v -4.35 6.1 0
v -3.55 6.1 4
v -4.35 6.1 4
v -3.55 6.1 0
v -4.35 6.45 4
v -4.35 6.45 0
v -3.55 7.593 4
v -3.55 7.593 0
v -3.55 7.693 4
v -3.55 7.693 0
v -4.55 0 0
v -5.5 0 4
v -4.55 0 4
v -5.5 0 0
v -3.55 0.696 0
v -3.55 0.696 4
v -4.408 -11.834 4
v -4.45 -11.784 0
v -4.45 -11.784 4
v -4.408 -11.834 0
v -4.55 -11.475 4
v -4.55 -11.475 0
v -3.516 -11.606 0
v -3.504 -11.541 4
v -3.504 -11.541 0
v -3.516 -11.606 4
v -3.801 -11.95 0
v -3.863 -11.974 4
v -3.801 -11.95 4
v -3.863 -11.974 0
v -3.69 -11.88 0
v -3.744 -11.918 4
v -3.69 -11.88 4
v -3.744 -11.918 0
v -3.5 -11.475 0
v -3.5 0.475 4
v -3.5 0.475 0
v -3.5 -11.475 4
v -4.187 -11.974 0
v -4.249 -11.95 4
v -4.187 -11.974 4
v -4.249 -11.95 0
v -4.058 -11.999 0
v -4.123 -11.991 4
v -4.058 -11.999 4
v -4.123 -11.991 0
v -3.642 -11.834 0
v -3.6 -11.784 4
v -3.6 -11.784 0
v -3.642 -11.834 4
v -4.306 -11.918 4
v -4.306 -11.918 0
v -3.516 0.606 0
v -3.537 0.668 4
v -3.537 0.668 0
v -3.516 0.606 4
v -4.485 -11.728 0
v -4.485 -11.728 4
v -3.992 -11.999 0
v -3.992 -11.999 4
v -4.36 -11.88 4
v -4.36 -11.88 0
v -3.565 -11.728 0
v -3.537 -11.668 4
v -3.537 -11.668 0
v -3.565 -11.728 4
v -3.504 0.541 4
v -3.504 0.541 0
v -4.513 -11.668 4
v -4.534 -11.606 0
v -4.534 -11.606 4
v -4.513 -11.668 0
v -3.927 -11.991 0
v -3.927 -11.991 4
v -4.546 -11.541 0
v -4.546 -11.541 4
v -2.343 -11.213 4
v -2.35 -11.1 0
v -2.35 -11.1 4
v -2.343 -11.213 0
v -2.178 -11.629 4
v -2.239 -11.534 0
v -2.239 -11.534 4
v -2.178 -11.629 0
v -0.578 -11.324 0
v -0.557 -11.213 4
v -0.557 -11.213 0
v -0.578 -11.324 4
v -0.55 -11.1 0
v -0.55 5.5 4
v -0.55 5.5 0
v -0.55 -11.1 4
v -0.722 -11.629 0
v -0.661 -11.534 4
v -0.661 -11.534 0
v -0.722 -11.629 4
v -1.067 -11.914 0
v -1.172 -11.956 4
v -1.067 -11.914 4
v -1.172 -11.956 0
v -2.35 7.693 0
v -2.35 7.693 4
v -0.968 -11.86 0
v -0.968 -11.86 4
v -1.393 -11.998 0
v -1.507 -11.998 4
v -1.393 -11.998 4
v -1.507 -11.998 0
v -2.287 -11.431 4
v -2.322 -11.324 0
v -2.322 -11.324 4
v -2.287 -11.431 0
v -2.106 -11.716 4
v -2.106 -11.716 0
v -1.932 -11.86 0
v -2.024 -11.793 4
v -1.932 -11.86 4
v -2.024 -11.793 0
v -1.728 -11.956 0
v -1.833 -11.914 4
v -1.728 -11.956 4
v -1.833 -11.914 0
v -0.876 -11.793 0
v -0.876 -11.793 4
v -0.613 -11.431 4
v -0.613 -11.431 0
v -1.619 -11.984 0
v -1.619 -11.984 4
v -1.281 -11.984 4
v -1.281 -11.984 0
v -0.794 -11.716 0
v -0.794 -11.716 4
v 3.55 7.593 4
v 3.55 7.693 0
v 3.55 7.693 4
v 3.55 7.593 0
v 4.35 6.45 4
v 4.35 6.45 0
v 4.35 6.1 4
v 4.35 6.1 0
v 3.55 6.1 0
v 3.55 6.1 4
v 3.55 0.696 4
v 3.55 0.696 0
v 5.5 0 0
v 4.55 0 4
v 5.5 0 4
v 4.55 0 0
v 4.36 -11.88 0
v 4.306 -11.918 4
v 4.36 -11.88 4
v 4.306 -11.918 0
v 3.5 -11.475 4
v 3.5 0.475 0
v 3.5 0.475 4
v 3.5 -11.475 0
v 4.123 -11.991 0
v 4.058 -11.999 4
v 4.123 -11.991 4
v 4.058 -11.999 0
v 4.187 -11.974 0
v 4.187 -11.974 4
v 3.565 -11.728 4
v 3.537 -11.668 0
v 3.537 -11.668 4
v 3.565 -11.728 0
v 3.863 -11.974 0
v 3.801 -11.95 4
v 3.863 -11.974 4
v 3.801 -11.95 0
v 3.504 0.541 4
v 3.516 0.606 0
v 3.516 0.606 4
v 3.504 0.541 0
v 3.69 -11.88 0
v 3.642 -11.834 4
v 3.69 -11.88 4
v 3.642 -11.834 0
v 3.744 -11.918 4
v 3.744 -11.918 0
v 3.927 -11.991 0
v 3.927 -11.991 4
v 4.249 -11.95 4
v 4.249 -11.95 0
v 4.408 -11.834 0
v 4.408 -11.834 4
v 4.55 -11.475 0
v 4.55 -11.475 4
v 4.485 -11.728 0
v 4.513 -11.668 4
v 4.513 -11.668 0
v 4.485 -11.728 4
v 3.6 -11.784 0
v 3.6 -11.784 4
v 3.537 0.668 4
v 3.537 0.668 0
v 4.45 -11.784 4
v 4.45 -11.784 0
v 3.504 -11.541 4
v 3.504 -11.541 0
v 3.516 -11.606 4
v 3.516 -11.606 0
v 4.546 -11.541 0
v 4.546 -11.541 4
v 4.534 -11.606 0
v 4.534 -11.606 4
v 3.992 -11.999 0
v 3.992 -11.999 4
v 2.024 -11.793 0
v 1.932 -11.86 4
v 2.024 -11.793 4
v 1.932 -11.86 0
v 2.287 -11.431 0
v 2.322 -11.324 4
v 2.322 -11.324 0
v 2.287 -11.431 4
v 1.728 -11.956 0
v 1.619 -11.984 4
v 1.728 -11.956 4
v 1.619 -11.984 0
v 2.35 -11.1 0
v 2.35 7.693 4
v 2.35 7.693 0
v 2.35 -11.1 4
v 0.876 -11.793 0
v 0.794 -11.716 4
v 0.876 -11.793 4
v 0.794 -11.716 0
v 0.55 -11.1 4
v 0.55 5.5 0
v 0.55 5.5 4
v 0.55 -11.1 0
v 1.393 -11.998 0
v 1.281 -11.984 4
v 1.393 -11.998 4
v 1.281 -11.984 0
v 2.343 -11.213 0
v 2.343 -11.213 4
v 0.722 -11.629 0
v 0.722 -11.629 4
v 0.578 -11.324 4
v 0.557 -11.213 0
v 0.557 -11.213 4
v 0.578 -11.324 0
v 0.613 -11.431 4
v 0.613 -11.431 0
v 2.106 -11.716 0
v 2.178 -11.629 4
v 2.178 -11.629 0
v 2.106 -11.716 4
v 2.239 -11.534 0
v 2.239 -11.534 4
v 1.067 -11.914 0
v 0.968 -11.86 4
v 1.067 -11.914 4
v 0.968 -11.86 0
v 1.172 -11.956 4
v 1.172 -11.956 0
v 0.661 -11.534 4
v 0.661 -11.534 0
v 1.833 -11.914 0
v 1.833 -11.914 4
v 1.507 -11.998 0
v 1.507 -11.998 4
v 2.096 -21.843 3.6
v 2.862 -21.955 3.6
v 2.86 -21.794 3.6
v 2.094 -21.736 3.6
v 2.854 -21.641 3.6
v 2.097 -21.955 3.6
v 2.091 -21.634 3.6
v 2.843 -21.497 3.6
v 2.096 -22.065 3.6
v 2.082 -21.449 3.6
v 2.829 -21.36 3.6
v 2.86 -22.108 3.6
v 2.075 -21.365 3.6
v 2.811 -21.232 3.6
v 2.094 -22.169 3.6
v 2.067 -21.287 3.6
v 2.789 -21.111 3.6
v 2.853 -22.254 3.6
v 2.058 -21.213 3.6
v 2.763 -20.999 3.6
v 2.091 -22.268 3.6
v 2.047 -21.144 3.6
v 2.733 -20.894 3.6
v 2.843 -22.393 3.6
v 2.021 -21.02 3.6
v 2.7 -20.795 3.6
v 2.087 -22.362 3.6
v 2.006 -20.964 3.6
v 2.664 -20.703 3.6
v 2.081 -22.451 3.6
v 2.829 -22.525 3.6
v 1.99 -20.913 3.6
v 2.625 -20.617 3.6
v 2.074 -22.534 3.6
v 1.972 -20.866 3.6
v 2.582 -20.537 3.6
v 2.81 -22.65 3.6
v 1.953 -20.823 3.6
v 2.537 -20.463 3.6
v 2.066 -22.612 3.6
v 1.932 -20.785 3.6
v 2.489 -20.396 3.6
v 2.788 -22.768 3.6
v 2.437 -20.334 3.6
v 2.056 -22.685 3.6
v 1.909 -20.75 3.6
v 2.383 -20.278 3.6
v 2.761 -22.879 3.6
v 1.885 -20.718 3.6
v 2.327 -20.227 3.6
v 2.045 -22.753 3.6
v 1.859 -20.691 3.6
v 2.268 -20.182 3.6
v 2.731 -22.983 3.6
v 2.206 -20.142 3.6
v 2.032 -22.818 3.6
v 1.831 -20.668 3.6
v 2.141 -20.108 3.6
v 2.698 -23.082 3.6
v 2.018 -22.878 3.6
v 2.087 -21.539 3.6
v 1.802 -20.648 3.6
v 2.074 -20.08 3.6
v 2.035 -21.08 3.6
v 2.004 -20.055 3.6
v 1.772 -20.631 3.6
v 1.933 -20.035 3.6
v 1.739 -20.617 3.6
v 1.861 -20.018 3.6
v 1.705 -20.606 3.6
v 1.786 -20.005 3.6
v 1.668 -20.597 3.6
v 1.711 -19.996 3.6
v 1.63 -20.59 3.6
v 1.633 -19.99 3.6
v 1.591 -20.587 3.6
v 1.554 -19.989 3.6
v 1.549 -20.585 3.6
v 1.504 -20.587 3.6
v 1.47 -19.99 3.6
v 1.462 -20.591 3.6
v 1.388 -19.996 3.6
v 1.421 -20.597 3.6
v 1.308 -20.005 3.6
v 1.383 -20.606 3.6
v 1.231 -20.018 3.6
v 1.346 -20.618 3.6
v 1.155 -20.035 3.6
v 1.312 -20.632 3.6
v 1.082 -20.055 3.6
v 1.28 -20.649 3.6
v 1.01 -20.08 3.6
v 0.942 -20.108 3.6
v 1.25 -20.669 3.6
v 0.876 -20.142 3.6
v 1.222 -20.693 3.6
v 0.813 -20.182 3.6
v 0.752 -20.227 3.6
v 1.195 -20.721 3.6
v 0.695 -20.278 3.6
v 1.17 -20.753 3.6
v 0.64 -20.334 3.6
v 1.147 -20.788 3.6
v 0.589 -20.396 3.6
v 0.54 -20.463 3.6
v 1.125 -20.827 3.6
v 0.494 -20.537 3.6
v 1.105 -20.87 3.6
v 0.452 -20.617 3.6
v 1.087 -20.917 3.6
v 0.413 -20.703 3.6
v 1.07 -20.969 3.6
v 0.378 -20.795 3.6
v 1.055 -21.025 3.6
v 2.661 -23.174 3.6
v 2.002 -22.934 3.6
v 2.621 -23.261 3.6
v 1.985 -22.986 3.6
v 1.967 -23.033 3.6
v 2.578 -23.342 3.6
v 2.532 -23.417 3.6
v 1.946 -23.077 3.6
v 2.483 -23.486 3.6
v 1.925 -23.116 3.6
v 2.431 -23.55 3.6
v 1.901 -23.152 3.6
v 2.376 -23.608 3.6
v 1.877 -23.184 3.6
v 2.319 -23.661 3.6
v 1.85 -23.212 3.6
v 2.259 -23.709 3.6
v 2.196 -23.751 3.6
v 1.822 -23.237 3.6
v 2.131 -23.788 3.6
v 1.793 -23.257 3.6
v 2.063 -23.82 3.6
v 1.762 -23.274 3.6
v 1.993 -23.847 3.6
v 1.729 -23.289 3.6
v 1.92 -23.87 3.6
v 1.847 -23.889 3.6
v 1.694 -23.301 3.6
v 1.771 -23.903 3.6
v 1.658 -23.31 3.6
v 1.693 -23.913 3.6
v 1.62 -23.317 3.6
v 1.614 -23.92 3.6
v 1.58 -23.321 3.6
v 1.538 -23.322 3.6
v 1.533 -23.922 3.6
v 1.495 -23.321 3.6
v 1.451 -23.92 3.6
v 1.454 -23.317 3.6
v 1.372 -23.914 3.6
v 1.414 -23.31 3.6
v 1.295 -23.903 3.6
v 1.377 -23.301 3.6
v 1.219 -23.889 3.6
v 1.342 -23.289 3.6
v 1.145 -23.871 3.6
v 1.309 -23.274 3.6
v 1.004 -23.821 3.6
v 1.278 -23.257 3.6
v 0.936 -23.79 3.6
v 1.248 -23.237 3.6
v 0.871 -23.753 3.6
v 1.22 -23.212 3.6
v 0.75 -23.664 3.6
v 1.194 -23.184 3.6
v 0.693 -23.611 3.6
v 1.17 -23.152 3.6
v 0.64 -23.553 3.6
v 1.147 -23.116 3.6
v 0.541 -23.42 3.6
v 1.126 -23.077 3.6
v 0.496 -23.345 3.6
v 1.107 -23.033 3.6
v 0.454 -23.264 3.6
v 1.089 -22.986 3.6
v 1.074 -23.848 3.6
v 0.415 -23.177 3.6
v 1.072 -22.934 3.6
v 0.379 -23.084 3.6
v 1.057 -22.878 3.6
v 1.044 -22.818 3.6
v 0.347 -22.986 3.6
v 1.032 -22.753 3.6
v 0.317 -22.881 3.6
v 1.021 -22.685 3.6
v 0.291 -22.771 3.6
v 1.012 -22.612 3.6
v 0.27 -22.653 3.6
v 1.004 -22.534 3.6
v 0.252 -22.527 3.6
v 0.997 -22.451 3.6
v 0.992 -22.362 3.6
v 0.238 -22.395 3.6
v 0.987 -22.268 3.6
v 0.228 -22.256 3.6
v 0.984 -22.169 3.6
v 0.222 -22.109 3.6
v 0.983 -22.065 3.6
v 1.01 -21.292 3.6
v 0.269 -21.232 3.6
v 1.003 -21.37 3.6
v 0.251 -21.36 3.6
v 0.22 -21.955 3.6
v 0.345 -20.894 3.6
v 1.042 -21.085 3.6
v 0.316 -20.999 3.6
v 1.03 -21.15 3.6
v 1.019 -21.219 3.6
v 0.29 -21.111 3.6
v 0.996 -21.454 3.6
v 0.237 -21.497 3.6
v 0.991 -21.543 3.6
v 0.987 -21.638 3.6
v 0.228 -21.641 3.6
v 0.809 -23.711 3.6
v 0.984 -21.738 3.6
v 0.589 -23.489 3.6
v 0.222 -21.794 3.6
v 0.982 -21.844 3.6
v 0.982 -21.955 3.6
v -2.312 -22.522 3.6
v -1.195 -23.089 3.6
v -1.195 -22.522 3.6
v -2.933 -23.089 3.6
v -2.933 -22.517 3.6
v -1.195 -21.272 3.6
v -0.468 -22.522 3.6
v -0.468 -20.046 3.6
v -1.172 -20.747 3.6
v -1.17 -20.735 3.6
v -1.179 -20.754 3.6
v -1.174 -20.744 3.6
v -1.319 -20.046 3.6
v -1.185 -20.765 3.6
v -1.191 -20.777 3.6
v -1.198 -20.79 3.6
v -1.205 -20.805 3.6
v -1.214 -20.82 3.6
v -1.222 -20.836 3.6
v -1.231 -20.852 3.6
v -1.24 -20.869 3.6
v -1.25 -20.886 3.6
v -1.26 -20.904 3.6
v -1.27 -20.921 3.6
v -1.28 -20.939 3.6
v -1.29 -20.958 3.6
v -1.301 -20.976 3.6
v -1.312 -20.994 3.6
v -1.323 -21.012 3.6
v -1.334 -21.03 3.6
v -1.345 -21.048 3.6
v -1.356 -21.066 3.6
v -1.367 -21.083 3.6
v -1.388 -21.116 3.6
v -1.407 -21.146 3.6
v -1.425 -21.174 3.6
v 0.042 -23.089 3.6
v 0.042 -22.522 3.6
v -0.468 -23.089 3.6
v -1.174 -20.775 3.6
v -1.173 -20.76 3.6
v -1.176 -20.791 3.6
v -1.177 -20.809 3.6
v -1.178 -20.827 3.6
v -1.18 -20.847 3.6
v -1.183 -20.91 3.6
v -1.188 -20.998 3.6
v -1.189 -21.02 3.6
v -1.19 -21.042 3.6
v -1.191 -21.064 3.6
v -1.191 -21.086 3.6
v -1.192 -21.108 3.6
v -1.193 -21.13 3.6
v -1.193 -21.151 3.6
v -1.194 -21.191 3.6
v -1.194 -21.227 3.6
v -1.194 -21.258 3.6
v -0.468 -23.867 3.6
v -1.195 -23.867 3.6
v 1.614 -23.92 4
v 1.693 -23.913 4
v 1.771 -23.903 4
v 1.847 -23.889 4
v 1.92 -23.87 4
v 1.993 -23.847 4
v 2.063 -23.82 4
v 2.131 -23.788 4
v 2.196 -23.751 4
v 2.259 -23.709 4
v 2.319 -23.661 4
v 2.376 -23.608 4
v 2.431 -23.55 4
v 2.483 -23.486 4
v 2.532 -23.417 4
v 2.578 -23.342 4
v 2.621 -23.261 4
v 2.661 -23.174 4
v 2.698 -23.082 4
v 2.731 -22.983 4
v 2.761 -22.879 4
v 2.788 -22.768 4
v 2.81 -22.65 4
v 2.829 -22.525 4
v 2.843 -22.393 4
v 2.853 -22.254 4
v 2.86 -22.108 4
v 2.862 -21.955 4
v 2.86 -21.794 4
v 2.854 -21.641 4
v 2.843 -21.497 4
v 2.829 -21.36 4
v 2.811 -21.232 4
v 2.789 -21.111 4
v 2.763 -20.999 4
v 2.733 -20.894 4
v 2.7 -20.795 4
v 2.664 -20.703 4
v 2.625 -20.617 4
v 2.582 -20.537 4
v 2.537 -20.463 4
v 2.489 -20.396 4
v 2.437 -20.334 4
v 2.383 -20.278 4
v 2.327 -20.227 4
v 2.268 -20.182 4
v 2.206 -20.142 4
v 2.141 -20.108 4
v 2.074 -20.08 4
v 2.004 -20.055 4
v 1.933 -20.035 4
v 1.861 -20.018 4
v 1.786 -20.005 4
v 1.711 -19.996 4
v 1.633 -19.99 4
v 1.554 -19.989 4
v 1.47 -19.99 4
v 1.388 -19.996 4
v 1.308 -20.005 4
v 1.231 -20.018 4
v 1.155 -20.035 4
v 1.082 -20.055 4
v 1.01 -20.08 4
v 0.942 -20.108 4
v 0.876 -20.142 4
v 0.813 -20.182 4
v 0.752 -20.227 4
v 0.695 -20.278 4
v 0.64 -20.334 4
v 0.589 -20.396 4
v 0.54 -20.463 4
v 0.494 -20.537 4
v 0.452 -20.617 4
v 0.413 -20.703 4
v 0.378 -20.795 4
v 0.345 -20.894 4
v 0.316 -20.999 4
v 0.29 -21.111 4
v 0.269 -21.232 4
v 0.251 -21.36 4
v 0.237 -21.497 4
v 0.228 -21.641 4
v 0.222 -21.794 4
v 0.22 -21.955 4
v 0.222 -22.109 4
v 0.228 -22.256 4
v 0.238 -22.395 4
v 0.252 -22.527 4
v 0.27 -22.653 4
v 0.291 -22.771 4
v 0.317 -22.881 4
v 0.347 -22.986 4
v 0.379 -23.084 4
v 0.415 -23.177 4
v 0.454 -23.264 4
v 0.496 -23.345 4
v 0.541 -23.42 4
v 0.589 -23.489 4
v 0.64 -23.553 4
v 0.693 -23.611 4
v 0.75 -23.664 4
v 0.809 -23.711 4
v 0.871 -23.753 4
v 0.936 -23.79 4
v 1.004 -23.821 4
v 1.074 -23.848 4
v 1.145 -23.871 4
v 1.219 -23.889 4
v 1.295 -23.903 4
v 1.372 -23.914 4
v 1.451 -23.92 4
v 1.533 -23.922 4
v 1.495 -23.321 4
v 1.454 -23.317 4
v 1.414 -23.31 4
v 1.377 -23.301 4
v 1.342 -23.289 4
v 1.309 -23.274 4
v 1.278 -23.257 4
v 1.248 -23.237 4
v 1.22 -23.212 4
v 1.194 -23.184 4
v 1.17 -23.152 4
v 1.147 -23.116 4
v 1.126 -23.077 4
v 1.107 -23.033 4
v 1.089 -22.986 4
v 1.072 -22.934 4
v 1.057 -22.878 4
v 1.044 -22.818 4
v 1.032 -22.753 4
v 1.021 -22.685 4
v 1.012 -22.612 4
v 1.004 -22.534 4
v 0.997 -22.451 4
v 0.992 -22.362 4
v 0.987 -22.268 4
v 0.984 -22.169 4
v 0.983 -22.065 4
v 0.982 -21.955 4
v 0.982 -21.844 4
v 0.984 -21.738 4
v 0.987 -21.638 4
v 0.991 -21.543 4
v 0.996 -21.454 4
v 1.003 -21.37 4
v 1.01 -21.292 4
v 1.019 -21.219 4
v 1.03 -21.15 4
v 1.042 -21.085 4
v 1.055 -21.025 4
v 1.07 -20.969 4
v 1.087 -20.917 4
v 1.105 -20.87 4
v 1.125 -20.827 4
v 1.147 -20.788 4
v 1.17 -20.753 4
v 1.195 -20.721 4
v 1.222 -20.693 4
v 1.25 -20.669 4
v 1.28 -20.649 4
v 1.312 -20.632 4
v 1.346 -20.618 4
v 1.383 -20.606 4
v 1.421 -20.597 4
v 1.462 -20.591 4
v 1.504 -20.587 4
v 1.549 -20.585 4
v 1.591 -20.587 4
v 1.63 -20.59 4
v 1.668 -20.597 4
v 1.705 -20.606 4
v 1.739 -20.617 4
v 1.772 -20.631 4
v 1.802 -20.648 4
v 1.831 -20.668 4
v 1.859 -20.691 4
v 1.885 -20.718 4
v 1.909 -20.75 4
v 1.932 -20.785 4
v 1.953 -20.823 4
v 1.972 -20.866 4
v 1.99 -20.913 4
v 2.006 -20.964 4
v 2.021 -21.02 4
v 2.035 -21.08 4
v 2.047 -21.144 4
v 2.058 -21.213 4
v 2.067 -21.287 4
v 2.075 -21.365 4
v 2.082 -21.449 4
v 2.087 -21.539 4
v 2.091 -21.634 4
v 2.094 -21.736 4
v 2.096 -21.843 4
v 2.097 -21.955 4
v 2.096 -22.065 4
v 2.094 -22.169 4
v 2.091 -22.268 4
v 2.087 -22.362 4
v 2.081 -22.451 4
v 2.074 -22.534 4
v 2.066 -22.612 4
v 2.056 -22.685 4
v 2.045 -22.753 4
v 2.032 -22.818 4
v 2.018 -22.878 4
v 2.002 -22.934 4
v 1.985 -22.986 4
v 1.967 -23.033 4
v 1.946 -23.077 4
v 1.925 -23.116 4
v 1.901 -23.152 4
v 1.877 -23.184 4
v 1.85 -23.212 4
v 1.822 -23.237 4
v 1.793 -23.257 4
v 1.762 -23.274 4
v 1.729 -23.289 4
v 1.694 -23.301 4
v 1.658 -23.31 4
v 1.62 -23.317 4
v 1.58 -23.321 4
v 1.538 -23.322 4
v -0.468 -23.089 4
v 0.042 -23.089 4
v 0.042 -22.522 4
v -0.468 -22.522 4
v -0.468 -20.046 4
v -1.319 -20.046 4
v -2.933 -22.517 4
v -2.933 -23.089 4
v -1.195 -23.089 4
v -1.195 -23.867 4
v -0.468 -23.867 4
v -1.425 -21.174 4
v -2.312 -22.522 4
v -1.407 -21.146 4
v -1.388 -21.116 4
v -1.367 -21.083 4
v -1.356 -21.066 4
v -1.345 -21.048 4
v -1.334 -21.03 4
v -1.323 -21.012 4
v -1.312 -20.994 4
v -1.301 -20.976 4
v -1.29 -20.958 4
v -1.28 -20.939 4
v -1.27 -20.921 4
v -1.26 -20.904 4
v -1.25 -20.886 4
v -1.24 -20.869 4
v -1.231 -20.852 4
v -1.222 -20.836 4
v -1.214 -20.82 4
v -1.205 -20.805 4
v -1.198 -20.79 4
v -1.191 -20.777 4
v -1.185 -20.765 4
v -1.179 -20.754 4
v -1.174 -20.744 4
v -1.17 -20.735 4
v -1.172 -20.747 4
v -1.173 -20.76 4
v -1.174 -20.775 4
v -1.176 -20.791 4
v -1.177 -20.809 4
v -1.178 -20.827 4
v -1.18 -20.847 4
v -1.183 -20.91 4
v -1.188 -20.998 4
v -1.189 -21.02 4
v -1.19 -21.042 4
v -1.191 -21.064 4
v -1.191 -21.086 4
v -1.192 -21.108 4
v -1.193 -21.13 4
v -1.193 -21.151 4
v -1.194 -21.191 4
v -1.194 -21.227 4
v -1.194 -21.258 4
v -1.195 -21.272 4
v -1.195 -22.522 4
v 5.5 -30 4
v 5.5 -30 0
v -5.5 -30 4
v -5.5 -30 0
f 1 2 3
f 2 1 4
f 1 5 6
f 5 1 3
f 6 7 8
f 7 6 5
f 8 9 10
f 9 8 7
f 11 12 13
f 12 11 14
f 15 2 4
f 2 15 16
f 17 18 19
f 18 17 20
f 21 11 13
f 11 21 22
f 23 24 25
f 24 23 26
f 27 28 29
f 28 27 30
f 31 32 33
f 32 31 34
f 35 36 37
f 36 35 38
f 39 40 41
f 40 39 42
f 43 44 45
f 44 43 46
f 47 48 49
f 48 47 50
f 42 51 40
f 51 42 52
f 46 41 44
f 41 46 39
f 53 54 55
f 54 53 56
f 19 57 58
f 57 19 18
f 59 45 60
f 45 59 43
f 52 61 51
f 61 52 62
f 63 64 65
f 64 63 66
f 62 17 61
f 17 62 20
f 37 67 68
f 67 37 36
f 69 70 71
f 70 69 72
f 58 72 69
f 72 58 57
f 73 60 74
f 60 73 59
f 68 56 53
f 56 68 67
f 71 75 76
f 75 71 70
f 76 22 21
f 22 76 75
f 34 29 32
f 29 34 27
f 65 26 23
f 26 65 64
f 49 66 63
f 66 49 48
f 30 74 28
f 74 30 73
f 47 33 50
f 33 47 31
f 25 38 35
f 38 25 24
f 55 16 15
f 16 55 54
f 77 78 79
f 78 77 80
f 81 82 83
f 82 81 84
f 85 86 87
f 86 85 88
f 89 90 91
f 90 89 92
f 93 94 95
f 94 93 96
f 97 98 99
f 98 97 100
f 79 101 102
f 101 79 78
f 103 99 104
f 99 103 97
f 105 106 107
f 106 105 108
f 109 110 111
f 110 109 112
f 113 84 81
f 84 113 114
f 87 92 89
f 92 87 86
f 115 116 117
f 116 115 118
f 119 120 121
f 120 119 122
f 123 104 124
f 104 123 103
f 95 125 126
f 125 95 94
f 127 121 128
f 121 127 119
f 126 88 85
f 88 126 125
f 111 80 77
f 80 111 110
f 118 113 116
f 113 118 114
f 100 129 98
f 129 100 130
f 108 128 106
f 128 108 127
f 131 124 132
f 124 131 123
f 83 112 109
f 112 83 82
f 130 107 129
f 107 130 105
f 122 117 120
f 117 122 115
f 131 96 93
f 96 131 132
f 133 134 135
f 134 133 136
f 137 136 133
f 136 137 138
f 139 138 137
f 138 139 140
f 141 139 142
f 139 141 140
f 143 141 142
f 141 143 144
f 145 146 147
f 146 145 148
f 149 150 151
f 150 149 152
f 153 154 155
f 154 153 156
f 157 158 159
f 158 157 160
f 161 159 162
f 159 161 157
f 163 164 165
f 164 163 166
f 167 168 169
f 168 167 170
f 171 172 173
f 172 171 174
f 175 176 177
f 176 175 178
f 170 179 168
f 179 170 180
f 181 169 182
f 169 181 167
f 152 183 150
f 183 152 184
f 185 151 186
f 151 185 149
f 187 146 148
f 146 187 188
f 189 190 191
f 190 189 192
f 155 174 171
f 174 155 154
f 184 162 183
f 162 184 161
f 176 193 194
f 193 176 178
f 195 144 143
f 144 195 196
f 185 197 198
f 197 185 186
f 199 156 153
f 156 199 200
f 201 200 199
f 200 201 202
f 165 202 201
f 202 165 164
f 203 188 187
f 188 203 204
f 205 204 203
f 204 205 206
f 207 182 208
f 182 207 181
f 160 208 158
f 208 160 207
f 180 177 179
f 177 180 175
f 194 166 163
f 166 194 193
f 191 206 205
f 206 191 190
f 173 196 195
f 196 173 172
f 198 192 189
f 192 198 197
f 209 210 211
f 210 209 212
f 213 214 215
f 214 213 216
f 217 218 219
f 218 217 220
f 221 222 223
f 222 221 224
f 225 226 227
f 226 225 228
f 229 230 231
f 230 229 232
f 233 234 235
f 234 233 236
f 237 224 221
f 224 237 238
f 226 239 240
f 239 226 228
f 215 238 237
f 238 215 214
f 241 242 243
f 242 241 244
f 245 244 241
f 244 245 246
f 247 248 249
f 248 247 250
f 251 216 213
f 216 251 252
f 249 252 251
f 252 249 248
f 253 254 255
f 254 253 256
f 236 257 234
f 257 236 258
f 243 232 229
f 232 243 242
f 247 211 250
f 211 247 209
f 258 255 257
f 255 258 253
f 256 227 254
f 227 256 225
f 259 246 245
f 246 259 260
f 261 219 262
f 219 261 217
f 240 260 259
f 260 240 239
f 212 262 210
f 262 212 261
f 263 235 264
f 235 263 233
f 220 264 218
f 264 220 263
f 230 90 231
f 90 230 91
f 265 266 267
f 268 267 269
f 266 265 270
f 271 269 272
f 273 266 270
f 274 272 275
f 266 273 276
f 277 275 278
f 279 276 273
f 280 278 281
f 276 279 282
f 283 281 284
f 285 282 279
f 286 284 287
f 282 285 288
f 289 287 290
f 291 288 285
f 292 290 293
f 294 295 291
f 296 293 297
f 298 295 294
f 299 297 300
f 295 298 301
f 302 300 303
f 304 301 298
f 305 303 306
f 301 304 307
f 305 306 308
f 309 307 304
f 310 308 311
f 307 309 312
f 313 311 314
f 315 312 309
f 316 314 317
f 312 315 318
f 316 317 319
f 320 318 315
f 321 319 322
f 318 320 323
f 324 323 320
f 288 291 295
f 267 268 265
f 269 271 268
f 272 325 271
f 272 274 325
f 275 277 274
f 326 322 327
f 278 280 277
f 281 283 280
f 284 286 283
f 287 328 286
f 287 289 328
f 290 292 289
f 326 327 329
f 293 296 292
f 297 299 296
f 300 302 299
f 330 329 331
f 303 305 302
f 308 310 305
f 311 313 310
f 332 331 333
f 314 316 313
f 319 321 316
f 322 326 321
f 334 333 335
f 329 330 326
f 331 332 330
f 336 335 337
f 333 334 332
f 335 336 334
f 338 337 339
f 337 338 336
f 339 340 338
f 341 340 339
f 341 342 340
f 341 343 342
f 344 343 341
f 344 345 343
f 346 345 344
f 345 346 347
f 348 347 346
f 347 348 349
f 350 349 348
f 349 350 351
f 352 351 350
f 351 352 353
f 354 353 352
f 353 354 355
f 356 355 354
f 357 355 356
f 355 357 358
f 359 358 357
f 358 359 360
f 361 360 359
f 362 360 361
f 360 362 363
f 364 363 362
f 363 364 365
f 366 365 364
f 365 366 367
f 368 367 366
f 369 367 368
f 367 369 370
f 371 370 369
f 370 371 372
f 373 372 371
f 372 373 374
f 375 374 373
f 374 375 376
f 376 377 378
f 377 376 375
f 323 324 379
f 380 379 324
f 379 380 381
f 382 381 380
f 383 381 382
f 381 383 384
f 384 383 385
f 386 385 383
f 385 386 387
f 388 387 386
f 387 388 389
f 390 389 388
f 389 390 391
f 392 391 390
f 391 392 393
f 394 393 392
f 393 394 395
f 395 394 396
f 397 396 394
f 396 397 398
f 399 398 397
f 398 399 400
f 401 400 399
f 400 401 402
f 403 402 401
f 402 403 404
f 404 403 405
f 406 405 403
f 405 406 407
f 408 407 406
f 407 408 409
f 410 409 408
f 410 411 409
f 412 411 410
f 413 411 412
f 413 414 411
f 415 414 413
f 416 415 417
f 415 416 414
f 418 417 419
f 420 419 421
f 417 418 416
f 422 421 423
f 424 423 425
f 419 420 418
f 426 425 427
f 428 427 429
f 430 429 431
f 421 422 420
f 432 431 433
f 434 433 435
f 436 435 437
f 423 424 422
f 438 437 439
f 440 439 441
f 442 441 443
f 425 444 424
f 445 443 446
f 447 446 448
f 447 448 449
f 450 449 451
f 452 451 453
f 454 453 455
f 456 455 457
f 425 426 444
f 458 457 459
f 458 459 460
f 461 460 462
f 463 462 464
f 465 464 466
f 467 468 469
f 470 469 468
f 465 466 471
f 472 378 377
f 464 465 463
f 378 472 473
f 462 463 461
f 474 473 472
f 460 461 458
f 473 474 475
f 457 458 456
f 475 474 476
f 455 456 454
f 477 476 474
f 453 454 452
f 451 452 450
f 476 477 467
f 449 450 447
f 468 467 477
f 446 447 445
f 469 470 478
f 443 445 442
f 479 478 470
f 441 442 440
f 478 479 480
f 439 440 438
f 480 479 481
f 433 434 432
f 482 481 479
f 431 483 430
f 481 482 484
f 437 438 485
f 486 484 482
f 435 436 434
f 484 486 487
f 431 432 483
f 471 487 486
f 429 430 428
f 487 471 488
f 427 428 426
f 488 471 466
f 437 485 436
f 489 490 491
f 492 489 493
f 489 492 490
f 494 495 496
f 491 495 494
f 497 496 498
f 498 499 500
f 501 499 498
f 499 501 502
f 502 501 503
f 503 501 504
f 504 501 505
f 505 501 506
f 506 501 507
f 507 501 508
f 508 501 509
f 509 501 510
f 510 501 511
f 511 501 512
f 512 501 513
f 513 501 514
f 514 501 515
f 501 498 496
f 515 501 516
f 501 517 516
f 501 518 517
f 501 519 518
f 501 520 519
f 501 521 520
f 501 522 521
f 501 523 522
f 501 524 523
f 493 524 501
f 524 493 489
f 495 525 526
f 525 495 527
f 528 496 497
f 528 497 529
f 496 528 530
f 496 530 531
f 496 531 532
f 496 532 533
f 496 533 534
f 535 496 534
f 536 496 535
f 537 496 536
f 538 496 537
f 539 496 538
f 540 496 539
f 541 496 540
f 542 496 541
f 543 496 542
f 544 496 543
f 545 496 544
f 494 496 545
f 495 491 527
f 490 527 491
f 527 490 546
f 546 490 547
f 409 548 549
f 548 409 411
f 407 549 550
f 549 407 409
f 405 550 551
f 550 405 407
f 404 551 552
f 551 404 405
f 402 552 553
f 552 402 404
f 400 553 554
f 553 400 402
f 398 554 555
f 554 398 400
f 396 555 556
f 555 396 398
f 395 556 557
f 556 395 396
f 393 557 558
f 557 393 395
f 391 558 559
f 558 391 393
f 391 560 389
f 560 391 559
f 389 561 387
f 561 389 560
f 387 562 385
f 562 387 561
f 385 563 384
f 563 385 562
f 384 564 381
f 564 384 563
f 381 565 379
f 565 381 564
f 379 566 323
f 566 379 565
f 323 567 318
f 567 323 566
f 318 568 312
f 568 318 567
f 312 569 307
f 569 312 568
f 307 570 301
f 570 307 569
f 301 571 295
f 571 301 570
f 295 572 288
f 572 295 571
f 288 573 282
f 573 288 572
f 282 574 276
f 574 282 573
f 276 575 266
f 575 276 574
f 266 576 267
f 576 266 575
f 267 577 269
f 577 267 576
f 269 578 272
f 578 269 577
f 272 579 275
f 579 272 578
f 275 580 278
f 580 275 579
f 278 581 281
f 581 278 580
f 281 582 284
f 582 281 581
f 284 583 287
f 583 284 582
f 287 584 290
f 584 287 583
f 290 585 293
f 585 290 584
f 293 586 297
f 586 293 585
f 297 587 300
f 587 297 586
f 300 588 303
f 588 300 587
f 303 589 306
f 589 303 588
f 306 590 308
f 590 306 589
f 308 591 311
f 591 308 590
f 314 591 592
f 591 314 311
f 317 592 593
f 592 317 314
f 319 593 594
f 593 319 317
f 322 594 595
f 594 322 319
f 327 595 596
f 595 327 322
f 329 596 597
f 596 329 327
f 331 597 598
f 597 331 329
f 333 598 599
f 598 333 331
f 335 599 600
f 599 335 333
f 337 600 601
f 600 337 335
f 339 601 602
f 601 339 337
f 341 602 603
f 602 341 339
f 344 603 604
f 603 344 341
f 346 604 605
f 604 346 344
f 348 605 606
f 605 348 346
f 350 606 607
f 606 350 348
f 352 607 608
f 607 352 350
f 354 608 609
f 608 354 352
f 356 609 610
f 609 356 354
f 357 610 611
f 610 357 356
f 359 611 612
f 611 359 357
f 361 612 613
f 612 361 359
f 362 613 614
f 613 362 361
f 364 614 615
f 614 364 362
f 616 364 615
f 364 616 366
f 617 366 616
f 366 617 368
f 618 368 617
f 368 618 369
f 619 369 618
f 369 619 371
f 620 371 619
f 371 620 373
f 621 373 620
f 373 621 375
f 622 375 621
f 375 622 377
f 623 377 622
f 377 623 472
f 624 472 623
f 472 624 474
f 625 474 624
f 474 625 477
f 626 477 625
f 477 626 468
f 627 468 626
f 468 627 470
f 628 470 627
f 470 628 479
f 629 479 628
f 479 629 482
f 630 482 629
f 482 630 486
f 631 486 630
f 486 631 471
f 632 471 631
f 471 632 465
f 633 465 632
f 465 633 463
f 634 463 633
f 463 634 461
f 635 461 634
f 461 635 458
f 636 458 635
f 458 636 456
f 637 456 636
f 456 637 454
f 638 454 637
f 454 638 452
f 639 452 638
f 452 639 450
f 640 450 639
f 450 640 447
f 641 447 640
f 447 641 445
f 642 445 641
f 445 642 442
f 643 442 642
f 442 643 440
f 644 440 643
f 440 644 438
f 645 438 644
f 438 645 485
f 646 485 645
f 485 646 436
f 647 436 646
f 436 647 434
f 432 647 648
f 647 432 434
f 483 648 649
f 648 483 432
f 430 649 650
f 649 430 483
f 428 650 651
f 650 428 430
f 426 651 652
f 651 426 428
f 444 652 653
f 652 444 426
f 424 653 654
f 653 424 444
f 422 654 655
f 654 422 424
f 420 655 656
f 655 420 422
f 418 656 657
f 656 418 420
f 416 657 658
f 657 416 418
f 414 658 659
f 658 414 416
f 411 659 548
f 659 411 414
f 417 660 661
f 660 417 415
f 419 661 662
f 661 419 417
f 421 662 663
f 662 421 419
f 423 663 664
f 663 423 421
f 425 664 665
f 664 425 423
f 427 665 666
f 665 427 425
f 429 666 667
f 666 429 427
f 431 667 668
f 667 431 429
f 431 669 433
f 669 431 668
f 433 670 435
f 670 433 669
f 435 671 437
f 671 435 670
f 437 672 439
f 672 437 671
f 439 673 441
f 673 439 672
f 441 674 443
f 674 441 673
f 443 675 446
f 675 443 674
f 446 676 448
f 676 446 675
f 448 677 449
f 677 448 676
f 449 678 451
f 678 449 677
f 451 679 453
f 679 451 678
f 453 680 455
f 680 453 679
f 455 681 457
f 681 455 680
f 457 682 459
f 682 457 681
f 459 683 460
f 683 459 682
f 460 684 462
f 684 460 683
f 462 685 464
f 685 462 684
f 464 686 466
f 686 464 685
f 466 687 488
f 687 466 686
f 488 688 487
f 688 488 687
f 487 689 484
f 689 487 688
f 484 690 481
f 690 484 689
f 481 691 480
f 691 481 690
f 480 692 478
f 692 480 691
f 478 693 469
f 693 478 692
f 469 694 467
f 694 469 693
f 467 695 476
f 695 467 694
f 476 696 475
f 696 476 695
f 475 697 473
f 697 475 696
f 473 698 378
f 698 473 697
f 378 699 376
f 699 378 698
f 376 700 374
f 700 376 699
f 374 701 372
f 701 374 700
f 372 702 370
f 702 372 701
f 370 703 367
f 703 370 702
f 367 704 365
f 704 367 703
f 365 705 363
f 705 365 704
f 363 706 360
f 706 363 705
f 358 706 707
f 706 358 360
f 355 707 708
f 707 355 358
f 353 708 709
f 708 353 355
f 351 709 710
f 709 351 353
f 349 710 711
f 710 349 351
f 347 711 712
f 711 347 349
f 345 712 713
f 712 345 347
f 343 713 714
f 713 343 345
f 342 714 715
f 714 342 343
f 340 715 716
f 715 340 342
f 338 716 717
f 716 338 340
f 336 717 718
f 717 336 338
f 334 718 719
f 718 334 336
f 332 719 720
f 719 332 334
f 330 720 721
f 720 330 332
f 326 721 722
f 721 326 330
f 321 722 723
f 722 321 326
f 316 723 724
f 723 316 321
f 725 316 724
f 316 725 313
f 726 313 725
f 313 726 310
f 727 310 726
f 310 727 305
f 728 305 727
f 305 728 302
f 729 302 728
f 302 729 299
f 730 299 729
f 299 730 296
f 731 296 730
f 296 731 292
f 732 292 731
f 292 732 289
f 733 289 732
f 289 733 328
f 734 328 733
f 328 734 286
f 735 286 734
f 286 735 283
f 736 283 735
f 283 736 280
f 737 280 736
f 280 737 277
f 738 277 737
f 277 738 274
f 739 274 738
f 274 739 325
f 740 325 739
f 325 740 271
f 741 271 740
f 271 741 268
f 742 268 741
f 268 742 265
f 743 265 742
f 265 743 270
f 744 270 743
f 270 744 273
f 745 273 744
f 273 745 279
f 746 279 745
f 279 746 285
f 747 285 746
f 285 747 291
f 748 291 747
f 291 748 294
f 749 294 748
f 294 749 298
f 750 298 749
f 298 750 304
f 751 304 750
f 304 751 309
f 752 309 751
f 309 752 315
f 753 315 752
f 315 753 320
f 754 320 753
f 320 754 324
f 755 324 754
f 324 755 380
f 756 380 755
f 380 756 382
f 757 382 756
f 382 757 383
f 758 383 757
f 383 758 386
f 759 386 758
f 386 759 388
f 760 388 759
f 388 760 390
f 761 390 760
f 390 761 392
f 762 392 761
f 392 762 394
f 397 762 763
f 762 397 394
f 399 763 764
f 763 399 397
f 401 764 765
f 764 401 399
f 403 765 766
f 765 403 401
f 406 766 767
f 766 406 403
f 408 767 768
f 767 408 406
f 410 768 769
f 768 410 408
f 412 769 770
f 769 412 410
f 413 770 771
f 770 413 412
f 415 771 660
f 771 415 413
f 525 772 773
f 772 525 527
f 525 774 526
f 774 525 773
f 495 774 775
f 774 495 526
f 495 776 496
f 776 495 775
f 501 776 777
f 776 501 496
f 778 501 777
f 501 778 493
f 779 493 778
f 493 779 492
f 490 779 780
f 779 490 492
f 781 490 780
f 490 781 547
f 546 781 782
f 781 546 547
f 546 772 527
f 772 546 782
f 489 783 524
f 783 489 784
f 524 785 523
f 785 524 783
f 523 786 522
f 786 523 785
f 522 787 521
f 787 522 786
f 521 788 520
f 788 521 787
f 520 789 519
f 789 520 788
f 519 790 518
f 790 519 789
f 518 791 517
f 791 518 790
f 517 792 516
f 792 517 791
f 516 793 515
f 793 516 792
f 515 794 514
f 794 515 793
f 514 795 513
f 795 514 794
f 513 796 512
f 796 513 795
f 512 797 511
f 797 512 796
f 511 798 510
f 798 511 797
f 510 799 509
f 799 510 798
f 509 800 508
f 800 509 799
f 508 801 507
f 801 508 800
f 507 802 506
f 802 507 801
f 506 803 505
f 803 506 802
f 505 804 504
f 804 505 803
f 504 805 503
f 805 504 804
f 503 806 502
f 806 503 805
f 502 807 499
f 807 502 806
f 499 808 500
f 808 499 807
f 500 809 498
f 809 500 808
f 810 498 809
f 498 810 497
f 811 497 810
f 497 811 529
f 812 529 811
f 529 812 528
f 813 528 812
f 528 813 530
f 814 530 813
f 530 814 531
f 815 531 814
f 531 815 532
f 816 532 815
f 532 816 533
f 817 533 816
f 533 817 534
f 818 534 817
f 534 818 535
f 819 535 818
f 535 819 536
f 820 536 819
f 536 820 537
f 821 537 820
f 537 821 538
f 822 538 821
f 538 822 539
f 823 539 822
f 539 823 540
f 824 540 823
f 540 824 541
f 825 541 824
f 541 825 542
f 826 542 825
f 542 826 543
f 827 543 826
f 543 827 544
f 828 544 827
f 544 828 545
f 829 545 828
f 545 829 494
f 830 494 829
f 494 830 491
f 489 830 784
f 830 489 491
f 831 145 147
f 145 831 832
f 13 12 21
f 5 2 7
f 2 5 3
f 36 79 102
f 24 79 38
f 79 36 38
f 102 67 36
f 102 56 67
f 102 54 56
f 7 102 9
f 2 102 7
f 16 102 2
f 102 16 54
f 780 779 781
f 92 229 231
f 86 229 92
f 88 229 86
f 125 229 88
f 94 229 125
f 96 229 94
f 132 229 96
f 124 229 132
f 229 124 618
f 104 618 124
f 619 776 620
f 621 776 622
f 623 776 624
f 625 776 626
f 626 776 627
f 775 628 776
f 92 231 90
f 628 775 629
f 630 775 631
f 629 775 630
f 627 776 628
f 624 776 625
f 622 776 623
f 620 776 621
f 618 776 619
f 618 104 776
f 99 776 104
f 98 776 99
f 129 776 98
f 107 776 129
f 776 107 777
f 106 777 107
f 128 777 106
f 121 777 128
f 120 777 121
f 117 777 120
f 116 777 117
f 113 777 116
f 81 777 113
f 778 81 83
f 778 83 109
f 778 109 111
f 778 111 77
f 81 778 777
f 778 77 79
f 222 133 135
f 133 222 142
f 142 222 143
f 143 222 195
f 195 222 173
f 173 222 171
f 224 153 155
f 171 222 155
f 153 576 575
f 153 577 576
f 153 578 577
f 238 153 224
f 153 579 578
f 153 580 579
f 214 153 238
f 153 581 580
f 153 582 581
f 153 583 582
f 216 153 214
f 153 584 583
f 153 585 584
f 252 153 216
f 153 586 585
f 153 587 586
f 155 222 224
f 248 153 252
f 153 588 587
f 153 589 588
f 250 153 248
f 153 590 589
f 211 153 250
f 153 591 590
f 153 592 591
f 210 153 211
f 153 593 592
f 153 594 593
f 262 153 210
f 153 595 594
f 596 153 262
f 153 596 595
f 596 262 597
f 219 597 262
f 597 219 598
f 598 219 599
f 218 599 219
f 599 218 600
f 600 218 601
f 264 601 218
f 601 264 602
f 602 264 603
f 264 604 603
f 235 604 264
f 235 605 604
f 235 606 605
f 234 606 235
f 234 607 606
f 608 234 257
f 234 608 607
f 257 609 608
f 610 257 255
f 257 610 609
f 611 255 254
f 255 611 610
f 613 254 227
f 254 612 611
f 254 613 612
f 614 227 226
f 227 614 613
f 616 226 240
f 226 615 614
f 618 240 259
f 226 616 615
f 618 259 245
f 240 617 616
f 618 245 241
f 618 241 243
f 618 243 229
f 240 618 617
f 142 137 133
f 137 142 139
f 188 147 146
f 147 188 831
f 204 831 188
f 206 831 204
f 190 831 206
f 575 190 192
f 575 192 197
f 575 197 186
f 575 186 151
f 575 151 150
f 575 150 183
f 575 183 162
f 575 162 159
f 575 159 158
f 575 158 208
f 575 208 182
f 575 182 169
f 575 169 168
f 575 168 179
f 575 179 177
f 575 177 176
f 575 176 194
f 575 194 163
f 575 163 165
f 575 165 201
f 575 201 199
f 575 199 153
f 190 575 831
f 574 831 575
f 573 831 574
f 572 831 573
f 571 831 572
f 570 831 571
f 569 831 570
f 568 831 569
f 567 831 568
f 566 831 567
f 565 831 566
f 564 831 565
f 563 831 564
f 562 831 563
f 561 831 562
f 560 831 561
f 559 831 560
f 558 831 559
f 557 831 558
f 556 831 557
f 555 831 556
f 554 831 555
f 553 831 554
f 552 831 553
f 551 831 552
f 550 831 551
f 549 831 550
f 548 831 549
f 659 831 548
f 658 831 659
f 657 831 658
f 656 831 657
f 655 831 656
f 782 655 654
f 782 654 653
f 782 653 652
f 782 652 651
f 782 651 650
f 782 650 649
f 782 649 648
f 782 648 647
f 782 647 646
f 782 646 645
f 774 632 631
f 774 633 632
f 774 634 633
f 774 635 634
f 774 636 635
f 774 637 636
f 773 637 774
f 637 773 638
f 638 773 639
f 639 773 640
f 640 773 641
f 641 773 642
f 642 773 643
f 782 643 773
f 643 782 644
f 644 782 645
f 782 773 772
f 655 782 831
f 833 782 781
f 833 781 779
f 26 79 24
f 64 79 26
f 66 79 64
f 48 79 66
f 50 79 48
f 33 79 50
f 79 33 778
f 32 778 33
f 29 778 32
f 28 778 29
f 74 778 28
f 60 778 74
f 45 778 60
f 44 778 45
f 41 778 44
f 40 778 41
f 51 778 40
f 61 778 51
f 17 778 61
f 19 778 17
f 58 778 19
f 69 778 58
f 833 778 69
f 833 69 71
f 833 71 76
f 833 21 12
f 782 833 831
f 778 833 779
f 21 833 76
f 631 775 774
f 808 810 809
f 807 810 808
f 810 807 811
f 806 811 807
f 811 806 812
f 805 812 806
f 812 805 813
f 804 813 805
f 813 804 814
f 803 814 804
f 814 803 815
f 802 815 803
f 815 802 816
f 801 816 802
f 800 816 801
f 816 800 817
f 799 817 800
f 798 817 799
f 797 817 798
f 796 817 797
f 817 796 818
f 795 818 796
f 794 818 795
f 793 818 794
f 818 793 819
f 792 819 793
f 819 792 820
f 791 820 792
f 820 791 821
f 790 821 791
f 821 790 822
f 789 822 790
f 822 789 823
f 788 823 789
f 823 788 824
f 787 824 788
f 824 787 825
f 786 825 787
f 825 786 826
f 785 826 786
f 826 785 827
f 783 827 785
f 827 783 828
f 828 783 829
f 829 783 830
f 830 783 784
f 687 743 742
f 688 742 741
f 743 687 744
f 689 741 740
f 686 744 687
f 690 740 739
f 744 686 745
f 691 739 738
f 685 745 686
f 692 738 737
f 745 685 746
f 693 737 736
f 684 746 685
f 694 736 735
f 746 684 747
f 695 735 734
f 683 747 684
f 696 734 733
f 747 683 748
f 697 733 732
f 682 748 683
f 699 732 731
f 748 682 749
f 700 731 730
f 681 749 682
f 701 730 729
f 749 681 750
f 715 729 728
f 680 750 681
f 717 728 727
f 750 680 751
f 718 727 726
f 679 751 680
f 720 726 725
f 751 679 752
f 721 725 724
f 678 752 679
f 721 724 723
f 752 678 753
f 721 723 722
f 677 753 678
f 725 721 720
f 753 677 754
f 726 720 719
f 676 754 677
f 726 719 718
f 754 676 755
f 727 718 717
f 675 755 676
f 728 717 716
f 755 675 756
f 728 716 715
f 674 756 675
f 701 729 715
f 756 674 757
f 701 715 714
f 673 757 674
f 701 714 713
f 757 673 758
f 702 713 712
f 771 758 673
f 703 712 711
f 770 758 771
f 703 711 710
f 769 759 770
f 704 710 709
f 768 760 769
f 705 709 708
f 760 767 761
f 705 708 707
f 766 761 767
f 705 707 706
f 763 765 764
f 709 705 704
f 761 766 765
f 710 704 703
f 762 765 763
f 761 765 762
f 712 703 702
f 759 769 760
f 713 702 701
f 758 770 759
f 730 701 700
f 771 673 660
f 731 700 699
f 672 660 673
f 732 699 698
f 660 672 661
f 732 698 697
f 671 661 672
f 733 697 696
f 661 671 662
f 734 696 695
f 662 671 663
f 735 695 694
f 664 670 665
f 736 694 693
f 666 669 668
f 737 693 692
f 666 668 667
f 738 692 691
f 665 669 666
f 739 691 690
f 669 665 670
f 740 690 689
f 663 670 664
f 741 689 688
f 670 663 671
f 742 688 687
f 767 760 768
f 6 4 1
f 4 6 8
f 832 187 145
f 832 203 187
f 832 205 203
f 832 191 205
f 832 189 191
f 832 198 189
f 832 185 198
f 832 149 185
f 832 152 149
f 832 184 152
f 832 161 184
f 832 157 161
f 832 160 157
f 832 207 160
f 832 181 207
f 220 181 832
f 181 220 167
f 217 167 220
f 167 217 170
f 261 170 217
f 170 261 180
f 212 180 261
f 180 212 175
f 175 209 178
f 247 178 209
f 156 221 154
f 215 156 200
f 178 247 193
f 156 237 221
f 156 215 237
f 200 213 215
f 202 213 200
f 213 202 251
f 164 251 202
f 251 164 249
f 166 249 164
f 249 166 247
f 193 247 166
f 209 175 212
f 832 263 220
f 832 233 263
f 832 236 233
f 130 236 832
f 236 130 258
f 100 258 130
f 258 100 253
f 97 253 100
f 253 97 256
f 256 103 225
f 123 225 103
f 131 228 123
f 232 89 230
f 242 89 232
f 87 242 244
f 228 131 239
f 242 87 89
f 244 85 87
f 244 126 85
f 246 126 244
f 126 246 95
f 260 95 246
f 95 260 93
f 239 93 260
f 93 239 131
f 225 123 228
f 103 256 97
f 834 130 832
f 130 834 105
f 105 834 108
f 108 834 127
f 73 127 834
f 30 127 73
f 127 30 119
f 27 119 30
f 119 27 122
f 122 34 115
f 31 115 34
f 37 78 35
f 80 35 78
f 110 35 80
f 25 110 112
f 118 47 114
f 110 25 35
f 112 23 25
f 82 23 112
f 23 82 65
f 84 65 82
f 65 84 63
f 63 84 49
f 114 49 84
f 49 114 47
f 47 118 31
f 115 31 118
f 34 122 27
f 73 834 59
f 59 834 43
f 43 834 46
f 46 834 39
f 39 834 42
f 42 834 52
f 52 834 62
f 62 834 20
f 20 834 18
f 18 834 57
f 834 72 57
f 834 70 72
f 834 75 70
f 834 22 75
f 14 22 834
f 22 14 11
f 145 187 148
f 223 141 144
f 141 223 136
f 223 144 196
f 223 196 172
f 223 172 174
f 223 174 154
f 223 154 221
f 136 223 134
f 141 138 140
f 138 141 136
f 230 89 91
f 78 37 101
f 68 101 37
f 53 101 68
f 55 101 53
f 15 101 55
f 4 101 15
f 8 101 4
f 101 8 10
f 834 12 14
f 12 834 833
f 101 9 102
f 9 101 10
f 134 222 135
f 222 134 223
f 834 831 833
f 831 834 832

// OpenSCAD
$fn = 50;

difference() {
	union() {
		translate(v = [0, 0, 0]) {
			rotate(a = [0, 0, 0]) {
				difference() {
					union() {
						translate(v = [-5.5, -30.0, 0]) {
							cube(size = [11.0, 37.69251840539369, 4.0]);
						}
					}
					union() {
						translate(v = [0, 0, -0.1]) {
							linear_extrude(height = 4.2) {
								polygon(points = [[-3.55, 0], [-3.55, 6.1], [-4.35, 6.1], [-4.35, 6.449999999999999], [-3.55, 7.592518405393691], [-3.55, 8.692518405393692], [-5.7, 8.692518405393692], [-5.7, 0]]);
							}
						}
						translate(v = [-4.0249999999999995, -5.5, -0.1]) {
							hull() {
								translate(v = [-0.0, 5.975, 0]) {
									cylinder(h = 4.2, r = 0.525);
								}
								translate(v = [0.0, 5.975, 0]) {
									cylinder(h = 4.2, r = 0.525);
								}
								translate(v = [-0.0, -5.975, 0]) {
									cylinder(h = 4.2, r = 0.525);
								}
								translate(v = [0.0, -5.975, 0]) {
									cylinder(h = 4.2, r = 0.525);
								}
							}
						}
						translate(v = [-1.4499999999999997, -1.6537407973031542, -0.1]) {
							hull() {
								translate(v = [-0.0, 9.446259202696845, 0]) {
									cylinder(h = 4.2, r = 0.8999999999999998);
								}
								translate(v = [0.0, 9.446259202696845, 0]) {
									cylinder(h = 4.2, r = 0.8999999999999998);
								}
								translate(v = [-0.0, -9.446259202696845, 0]) {
									cylinder(h = 4.2, r = 0.8999999999999998);
								}
								translate(v = [0.0, -9.446259202696845, 0]) {
									cylinder(h = 4.2, r = 0.8999999999999998);
								}
							}
						}
						translate(v = [0, 0, -0.1]) {
							linear_extrude(height = 4.2) {
								polygon(points = [[3.55, 0], [3.55, 6.1], [4.35, 6.1], [4.35, 6.449999999999999], [3.55, 7.592518405393691], [3.55, 8.692518405393692], [5.7, 8.692518405393692], [5.7, 0]]);
							}
						}
						translate(v = [4.0249999999999995, -5.5, -0.1]) {
							hull() {
								translate(v = [-0.0, 5.975, 0]) {
									cylinder(h = 4.2, r = 0.525);
								}
								translate(v = [0.0, 5.975, 0]) {
									cylinder(h = 4.2, r = 0.525);
								}
								translate(v = [-0.0, -5.975, 0]) {
									cylinder(h = 4.2, r = 0.525);
								}
								translate(v = [0.0, -5.975, 0]) {
									cylinder(h = 4.2, r = 0.525);
								}
							}
						}
						translate(v = [1.4499999999999997, -1.6537407973031542, -0.1]) {
							hull() {
								translate(v = [-0.0, 9.446259202696845, 0]) {
									cylinder(h = 4.2, r = 0.8999999999999998);
								}
								translate(v = [0.0, 9.446259202696845, 0]) {
									cylinder(h = 4.2, r = 0.8999999999999998);
								}
								translate(v = [-0.0, -9.446259202696845, 0]) {
									cylinder(h = 4.2, r = 0.8999999999999998);
								}
								translate(v = [0.0, -9.446259202696845, 0]) {
									cylinder(h = 4.2, r = 0.8999999999999998);
								}
							}
						}
						translate(v = [-0.6000000000000001, 5.5, -0.1]) {
							cube(size = [1.2000000000000002, 3.192518405393691, 4.2]);
						}
						translate(v = [0, -22, 3.6]) {
							linear_extrude(height = 0.5) {
								text(font = "Arial:style=Bold", halign = "center", size = 4.0, text = "40", valign = "center");
							}
						}
					}
				}
			}
		}
	}
	union();
}
